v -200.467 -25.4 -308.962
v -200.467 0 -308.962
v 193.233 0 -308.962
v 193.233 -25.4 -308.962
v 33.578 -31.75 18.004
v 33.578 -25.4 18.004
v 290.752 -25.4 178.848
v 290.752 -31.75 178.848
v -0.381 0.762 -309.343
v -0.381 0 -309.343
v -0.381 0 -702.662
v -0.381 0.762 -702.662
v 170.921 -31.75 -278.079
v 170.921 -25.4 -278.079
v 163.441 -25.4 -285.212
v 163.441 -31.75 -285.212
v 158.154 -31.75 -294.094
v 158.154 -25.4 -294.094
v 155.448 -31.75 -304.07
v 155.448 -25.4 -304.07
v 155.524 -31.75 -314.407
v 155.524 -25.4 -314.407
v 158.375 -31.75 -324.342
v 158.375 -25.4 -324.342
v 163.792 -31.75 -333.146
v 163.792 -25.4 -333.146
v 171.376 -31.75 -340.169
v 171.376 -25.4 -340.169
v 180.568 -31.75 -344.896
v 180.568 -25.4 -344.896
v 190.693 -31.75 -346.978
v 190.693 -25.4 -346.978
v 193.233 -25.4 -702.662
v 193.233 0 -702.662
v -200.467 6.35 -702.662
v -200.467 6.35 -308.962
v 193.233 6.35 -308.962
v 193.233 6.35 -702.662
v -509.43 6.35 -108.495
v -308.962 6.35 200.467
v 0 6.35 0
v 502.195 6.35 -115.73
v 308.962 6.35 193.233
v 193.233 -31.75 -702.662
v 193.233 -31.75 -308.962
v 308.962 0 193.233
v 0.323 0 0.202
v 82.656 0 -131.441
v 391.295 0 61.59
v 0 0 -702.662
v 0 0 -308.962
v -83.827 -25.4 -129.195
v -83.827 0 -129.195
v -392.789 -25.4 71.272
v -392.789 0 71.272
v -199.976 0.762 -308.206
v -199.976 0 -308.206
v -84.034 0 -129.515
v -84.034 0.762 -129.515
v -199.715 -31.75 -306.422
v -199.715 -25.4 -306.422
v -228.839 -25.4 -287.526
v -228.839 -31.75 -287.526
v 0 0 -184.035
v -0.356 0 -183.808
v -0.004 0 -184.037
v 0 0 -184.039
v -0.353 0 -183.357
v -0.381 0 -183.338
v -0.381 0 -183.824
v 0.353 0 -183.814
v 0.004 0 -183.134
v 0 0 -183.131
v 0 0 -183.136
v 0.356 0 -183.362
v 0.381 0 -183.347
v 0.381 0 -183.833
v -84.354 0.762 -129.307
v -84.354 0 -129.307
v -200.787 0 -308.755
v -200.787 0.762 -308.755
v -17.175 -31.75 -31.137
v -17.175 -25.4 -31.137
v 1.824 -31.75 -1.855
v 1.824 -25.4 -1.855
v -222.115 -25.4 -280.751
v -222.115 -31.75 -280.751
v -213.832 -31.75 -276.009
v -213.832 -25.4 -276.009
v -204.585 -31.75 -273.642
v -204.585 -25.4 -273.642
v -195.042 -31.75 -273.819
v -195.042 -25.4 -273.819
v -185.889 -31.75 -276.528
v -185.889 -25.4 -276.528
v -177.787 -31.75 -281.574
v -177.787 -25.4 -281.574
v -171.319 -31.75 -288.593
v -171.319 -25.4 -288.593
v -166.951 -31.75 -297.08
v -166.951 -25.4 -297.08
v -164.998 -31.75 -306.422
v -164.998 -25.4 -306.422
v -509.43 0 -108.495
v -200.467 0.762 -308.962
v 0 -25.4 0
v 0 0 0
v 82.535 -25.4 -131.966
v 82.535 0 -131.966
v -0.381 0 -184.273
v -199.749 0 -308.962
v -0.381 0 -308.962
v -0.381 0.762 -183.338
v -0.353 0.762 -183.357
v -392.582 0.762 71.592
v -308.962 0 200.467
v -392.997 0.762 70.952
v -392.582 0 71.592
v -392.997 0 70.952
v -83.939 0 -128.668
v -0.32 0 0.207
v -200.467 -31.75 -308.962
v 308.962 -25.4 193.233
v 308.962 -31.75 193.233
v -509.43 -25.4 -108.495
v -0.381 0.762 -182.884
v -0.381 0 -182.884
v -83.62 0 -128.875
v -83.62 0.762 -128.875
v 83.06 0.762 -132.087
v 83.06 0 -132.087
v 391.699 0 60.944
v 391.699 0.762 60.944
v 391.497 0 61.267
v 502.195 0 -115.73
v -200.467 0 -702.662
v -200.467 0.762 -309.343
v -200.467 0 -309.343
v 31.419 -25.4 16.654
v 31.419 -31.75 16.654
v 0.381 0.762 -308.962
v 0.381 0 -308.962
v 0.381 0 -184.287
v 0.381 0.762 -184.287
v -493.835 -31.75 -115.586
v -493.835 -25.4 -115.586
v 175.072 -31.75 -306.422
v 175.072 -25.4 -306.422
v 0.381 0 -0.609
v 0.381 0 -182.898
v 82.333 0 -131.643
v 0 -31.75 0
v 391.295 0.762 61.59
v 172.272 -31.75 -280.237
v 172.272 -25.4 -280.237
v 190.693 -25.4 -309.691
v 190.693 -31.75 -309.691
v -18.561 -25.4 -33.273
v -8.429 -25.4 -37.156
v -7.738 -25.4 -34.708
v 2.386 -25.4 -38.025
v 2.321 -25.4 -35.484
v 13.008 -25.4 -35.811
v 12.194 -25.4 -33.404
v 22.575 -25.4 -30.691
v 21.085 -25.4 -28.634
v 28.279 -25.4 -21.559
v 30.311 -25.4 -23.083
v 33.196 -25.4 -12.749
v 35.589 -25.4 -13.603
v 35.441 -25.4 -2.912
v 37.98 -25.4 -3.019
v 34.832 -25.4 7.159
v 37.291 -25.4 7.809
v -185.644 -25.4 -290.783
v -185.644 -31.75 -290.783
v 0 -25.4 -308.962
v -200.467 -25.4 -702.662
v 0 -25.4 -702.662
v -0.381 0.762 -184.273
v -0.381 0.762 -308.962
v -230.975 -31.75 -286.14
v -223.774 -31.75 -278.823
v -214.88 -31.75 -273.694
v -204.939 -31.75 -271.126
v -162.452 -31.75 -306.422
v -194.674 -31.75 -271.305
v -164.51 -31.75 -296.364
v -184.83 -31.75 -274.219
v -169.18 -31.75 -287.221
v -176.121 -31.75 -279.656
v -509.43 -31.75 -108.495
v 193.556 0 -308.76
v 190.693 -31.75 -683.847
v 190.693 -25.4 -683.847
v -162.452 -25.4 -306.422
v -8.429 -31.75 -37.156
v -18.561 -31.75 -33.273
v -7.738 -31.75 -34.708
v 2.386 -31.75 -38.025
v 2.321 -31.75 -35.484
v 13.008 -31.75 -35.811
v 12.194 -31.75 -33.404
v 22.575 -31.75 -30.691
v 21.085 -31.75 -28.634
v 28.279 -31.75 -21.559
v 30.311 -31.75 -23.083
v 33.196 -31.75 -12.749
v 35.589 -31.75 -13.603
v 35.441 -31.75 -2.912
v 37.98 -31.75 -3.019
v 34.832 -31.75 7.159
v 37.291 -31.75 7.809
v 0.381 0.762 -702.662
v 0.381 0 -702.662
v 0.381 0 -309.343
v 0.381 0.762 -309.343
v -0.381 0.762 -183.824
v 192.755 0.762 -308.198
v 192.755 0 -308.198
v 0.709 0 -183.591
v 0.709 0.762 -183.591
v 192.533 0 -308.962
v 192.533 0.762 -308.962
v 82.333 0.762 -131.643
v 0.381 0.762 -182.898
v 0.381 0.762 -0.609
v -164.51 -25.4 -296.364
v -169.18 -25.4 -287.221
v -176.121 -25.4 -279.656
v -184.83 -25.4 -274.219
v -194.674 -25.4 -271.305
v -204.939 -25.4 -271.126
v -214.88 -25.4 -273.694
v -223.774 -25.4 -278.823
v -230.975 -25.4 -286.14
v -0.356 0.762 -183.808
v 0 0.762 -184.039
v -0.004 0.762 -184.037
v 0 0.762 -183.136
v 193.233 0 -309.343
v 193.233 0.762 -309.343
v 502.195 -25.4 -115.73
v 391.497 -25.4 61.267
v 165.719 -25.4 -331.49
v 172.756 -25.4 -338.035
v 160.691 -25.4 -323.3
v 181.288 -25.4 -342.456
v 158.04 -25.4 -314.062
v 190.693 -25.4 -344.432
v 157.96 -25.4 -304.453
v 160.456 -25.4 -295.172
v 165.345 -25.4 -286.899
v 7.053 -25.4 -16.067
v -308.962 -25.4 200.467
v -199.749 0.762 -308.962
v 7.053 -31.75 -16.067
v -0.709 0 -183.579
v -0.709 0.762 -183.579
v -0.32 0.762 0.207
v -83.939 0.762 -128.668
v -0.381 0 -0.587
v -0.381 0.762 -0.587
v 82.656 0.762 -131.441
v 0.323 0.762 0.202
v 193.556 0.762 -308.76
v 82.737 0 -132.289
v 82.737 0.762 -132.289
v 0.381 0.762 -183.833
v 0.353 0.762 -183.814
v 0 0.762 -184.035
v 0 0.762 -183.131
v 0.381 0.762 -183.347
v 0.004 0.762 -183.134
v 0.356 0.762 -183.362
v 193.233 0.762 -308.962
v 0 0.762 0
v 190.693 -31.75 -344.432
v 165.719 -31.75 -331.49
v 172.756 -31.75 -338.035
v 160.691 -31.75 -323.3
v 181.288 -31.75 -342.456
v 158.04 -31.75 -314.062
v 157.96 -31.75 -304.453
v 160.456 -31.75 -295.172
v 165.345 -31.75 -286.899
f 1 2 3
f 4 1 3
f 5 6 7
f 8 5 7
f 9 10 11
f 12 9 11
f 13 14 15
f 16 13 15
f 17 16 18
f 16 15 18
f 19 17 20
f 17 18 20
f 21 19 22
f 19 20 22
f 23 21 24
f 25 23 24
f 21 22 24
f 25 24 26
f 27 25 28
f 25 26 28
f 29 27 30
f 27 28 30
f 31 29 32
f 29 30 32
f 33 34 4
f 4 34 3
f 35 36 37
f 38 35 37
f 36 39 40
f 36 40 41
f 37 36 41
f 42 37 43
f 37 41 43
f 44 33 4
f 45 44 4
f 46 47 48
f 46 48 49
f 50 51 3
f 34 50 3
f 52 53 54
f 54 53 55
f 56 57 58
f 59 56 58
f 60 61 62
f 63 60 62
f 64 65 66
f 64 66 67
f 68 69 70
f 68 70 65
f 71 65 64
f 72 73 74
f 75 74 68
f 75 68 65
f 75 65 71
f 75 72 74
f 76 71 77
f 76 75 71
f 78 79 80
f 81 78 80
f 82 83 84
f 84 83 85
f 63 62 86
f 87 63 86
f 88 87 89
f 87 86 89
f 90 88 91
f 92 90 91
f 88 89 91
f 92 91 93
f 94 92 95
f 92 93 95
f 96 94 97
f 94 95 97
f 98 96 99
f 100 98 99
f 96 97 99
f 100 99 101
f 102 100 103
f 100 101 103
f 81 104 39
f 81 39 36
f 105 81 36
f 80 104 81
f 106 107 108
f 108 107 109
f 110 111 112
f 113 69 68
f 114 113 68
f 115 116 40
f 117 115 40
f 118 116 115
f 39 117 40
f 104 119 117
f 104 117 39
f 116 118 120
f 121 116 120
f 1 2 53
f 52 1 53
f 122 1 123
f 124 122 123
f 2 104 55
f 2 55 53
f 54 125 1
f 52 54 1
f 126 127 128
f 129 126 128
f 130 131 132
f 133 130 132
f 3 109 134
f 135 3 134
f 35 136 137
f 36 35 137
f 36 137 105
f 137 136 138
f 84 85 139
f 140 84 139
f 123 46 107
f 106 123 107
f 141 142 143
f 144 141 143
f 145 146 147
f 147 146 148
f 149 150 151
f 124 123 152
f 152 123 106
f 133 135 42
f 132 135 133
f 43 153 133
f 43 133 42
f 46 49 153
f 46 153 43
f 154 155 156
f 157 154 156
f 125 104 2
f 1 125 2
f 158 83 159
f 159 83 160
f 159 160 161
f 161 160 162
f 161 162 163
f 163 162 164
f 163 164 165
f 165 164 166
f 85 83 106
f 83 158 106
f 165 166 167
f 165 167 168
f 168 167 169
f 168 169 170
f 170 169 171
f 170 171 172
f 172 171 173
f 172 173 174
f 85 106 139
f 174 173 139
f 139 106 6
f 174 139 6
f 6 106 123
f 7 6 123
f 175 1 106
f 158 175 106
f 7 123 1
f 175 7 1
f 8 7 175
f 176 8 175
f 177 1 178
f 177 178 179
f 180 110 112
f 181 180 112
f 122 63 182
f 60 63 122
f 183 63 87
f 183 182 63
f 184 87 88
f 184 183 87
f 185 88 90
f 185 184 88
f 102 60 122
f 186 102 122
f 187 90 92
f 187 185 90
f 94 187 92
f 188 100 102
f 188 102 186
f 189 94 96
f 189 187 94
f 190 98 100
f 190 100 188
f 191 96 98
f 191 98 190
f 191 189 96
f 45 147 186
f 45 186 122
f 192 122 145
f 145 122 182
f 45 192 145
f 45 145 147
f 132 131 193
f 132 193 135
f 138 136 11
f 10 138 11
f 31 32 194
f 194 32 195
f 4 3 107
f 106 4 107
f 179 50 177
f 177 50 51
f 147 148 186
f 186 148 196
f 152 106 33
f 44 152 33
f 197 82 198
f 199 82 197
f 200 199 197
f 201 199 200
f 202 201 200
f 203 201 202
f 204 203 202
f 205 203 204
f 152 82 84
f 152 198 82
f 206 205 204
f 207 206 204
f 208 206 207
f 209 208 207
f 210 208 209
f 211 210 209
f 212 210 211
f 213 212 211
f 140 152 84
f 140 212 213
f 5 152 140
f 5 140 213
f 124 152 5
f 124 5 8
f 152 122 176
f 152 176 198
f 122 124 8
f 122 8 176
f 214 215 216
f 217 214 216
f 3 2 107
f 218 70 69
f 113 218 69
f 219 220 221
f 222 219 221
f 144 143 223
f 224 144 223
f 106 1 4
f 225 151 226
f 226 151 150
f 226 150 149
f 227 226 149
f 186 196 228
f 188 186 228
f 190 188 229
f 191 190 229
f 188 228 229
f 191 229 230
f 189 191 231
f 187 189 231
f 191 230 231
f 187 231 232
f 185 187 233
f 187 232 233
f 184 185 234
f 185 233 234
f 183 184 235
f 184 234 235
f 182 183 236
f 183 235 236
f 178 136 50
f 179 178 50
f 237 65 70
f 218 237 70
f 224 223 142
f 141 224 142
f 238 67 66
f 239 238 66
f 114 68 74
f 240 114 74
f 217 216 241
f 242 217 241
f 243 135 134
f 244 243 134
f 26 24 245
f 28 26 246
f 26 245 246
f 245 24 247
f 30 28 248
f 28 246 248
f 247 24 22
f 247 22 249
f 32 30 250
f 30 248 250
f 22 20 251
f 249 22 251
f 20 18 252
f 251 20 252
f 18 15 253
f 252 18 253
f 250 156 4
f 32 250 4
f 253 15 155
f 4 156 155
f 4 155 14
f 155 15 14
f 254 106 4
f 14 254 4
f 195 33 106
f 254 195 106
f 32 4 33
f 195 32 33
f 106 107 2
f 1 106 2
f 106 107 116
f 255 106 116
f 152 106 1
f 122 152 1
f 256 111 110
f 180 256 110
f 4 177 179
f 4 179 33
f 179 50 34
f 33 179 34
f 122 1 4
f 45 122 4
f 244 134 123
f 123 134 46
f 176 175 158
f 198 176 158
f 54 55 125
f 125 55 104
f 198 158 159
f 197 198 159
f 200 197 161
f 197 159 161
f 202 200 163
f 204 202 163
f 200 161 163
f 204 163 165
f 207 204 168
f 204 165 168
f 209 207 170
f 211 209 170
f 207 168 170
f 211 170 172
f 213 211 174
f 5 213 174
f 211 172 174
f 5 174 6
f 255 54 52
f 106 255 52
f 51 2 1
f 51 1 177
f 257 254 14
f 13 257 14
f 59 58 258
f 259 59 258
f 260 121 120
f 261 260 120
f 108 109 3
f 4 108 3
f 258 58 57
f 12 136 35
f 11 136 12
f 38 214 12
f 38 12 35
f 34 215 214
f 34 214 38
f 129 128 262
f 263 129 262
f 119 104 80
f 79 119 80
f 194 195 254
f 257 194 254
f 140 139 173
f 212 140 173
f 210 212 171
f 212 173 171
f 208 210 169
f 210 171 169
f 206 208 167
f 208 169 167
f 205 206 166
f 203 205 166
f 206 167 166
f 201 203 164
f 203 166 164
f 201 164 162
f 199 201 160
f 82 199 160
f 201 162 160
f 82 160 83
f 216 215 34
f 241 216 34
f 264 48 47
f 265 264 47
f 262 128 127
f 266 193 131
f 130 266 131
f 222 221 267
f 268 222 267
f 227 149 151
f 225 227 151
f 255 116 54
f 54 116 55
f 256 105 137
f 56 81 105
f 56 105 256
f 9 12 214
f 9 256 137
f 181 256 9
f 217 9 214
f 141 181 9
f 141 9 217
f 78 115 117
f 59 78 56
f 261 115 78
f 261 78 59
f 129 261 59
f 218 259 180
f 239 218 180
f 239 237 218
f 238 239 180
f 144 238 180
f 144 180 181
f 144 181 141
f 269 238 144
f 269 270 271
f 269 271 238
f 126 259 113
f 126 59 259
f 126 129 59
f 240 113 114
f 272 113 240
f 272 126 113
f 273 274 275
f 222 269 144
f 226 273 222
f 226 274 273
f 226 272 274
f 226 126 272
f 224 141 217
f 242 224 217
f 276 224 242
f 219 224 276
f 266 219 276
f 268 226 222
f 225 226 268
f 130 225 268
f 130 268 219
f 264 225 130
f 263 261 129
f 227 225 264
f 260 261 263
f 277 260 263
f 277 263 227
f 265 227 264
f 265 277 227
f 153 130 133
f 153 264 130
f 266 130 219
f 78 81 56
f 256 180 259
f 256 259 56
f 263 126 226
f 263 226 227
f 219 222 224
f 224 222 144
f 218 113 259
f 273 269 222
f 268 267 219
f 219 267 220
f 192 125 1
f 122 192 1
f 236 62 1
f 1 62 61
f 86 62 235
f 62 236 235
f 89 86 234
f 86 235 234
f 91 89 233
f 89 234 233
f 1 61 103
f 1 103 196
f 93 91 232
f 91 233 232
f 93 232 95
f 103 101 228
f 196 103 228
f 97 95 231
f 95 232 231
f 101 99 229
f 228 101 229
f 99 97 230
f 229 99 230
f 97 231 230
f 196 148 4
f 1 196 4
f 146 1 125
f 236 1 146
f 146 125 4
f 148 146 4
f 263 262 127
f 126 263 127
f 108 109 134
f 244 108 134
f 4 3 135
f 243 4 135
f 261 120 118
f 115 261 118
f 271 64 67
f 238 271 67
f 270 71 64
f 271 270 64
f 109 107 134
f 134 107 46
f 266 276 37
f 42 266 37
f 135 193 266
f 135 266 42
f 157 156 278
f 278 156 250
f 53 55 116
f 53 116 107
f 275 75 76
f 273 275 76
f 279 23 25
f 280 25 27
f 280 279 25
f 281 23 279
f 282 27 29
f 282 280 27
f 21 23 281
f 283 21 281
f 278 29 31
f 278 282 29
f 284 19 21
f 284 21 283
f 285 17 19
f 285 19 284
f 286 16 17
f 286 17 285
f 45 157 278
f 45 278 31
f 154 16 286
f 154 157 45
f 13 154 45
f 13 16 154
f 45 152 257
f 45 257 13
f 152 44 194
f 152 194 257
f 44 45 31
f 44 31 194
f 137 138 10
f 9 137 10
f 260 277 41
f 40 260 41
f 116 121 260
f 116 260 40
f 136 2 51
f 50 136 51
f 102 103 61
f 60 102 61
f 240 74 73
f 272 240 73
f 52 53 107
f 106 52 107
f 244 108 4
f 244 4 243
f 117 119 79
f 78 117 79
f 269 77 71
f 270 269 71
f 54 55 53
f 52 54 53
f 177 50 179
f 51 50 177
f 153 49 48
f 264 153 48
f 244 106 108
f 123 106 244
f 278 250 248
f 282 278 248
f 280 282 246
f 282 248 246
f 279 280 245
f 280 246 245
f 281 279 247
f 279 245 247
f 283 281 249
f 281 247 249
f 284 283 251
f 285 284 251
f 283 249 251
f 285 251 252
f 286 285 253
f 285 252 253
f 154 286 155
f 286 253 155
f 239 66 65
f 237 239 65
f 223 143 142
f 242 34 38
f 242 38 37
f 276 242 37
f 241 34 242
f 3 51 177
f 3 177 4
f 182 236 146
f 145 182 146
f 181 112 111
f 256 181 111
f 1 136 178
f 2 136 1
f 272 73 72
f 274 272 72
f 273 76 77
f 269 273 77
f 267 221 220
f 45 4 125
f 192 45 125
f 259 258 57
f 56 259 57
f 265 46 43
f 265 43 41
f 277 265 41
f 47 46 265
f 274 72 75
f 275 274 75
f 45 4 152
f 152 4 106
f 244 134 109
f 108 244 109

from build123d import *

# Parameters (mm, degrees)
F0_W      = 200.4671369366
F0_H      = 393.7
F0_W_2    = 193.2328630634
F1_DEPTH  = 6.35
F4_DEPTH  = 0.762
F5_DEPTH  = 25.4
F6_DEPTH  = 25.4
F7_DEPTH  = 25.4
F8_DEPTH  = 25.4
F10_DEPTH = 6.35
F12_DEPTH = 6.35
F14_DEPTH = 6.35


with BuildPart() as f1:
    # F0 (on Front) → F1 (new body)
    with BuildSketch(Plane.XZ):
        Polygon((-83.8269108523, -129.1950943436), (0, 0), (-308.9624847913, 200.4671369366), (-392.7893956437, 71.272042593), align=None)
        Polygon((-200.4671369366, -308.9624847913), (-83.8269108523, -129.1950943436), (-392.7893956437, 71.272042593), (-509.429621728, -108.4953478547), align=None)
        with Locations((-100.2335684683, -505.8124847913)):
            Rectangle(F0_W, F0_H)
        with Locations((96.6164315317, -505.8124847913)):
            Rectangle(F0_W_2, F0_H)
        Polygon((391.4973095124, 61.2668810695), (82.5348247211, -131.9659819939), (193.2328630634, -308.9624847913), (502.1953478547, -115.729621728), align=None)
        Polygon((308.9624847913, 193.2328630634), (0, 0), (82.5348247211, -131.9659819939), (391.4973095124, 61.2668810695), align=None)
        Polygon((193.2328630634, -308.9624847913), (82.5348247211, -131.9659819939), (0, -183.5853250156), align=None)
        Polygon((82.5348247211, -131.9659819939), (0, 0), (0, -183.5853250156), align=None)
        Polygon((0, -183.5853250156), (0, 0), (-83.8269108523, -129.1950943436), align=None)
        Polygon((0, -183.5853250156), (-83.8269108523, -129.1950943436), (-200.4671369366, -308.9624847913), align=None)
        Polygon((0, -308.9624847913), (0, -183.5853250156), (-200.4671369366, -308.9624847913), align=None)
        Polygon((193.2328630634, -308.9624847913), (0, -183.5853250156), (0, -308.9624847913), align=None)
    extrude(amount=-F1_DEPTH)

    # F2 (on face) + F3 (on face) → F4 (cut)
    with BuildSketch(Plane.XZ):
        with BuildLine():
            Line((-0.381, -182.8839444602), (0, -183.1311523995))
            Line((0, -183.1311523995), (0.0037617167, -183.1335931508))
            Line((0.0037617167, -183.1335931508), (0.381, -182.8976588962))
            Line((0.381, -182.8976588962), (0.381, 0))
            ThreePointArc((0.381, 0), (0, 0.381), (-0.381, 0))
            Line((-0.381, 0), (-0.381, -182.8839444602))
        make_face()
        Polygon((0, -183.1359458225), (0, -183.1311523995), (-0.381, -182.8839444602), (-0.381, -183.3381170764), (-0.3526576381, -183.356506727), align=None)
        Polygon((0.381, -182.8976588962), (0.0037617167, -183.1335931508), (0.3564193548, -183.3624114395), (0.381, -183.3470380894), align=None)
        with BuildLine():
            Line((-0.381, -183.3381170764), (-0.381, -182.8839444602))
            Line((-0.381, -182.8839444602), (-392.5820158468, 71.5916589566))
            ThreePointArc((-392.5820158468, 71.5916589566), (-393.1090120072, 71.4794223899), (-392.9967754405, 70.9524262295))
            Line((-392.9967754405, 70.9524262295), (-0.7090769929, -183.5794203031))
            Line((-0.7090769929, -183.5794203031), (-0.381, -183.3742327487))
            Line((-0.381, -183.3742327487), (-0.381, -183.3381170764))
        make_face()
        with BuildLine():
            Line((391.2952812025, 61.5899067062), (0.381, -182.8976588962))
            Line((0.381, -182.8976588962), (0.381, -183.3470380894))
            Line((0.381, -183.3470380894), (0.381, -183.3783603388))
            Line((0.381, -183.3783603388), (0.7090769929, -183.5912297281))
            Line((0.7090769929, -183.5912297281), (391.6993378223, 60.9438554327))
            ThreePointArc((391.6993378223, 60.9438554327), (391.8203351492, 61.4689093794), (391.2952812025, 61.5899067062))
        make_face()
        Polygon((0.3526576381, -183.8141433043), (0, -184.0347042088), (0, -184.0394976317), (0.381, -184.286705571), (0.381, -183.8325329549), align=None)
        Polygon((-0.0037617167, -184.0370568805), (-0.3564193548, -183.8082385918), (-0.381, -183.8236119419), (-0.381, -184.272991135), align=None)
        Polygon((-0.381, -183.7922896925), (-0.381, -183.3742327487), (-0.7090769929, -183.5794203031), align=None)
        Polygon((0.7090769929, -183.5912297281), (0.381, -183.3783603388), (0.381, -183.7964172825), align=None)
        with BuildLine():
            Line((0.381, -184.286705571), (0, -184.0394976317))
            Line((0, -184.0394976317), (-0.0037617167, -184.0370568805))
            Line((-0.0037617167, -184.0370568805), (-0.381, -184.272991135))
            Line((-0.381, -184.272991135), (-0.381, -702.6624847913))
            ThreePointArc((-0.381, -702.6624847913), (0, -703.0434847913), (0.381, -702.6624847913))
            Line((0.381, -702.6624847913), (0.381, -184.286705571))
        make_face()
        with BuildLine():
            Line((0.381, -183.7964172825), (0.381, -183.8325329549))
            Line((0.381, -183.8325329549), (0.381, -184.286705571))
            Line((0.381, -184.286705571), (193.0254832665, -309.2821011549))
            ThreePointArc((193.0254832665, -309.2821011549), (193.552479427, -309.1698645882), (193.4402428602, -308.6428684278))
            Line((193.4402428602, -308.6428684278), (0.7090769929, -183.5912297281))
            Line((0.7090769929, -183.5912297281), (0.381, -183.7964172825))
        make_face()
        with BuildLine():
            Line((-0.381, -184.272991135), (-0.381, -183.8236119419))
            Line((-0.381, -183.8236119419), (-0.381, -183.7922896925))
            Line((-0.381, -183.7922896925), (-0.7090769929, -183.5794203031))
            Line((-0.7090769929, -183.5794203031), (-200.6691652465, -308.6394591546))
            ThreePointArc((-200.6691652465, -308.6394591546), (-200.7901625734, -309.1645131012), (-200.2651086267, -309.2855104281))
            Line((-200.2651086267, -309.2855104281), (-0.381, -184.272991135))
        make_face()
    with BuildSketch(Plane.XZ):
        with BuildLine():
            Line((-0.2288182887, -0.3526576381), (0, 0))
            Line((0, 0), (0.2229135762, -0.3564193548))
            Line((0.2229135762, -0.3564193548), (0.3196163636, -0.2073797968))
            ThreePointArc((0.3196163636, -0.2073797968), (0.3809867906, -0.0031725997), (0.3230256367, 0.2020283099))
            ThreePointArc((0.3230256367, 0.2020283099), (0.0031725997, 0.3809867906), (-0.3196163636, 0.2073797968))
            ThreePointArc((-0.3196163636, 0.2073797968), (-0.3809867906, 0.0031725997), (-0.3230256367, -0.2020283099))
            Line((-0.3230256367, -0.2020283099), (-0.2288182887, -0.3526576381))
        make_face()
        with BuildLine():
            Line((-200.2199289974, -308.5814847913), (-0.2288182887, -0.3526576381))
            Line((-0.2288182887, -0.3526576381), (-0.3230256367, -0.2020283099))
            ThreePointArc((-0.3230256367, -0.2020283099), (-0.3809867906, 0.0031725997), (-0.3196163636, 0.2073797968))
            Line((-0.3196163636, 0.2073797968), (-200.7867533002, -308.7551049945))
            ThreePointArc((-200.7867533002, -308.7551049945), (-200.6490013056, -308.6276917936), (-200.4671369366, -308.5814847913))
            Line((-200.4671369366, -308.5814847913), (-200.2199289974, -308.5814847913))
        make_face()
        with BuildLine():
            Line((0.3196163636, -0.2073797968), (0.2229135762, -0.3564193548))
            Line((0.2229135762, -0.3564193548), (192.9945761371, -308.5814847913))
            Line((192.9945761371, -308.5814847913), (193.2328630634, -308.5814847913))
            ThreePointArc((193.2328630634, -308.5814847913), (193.4175089595, -308.6292177917), (193.5558887001, -308.7604564814))
            Line((193.5558887001, -308.7604564814), (0.3230256367, 0.2020283099))
            ThreePointArc((0.3230256367, 0.2020283099), (0.3809867906, -0.0031725997), (0.3196163636, -0.2073797968))
        make_face()
        with BuildLine():
            Line((-200.4671369366, -308.9624847913), (-200.2199289974, -308.5814847913))
            Line((-200.2199289974, -308.5814847913), (-200.4671369366, -308.5814847913))
            ThreePointArc((-200.4671369366, -308.5814847913), (-200.6490013056, -308.6276917936), (-200.7867533002, -308.7551049945))
            ThreePointArc((-200.7867533002, -308.7551049945), (-200.8019299343, -309.1443491603), (-200.4671369366, -309.3434847913))
            ThreePointArc((-200.4671369366, -309.3434847913), (-200.2852725676, -309.297277789), (-200.147520573, -309.1698645882))
            Line((-200.147520573, -309.1698645882), (-200.0129643205, -308.9624847913))
            Line((-200.0129643205, -308.9624847913), (-200.4671369366, -308.9624847913))
        make_face()
        with BuildLine():
            Line((193.2328630634, -308.5814847913), (192.9945761371, -308.5814847913))
            Line((192.9945761371, -308.5814847913), (193.2328630634, -308.9624847913))
            Line((193.2328630634, -308.9624847913), (192.7834838702, -308.9624847913))
            Line((192.7834838702, -308.9624847913), (192.9098374266, -309.1645131012))
            ThreePointArc((192.9098374266, -309.1645131012), (193.0482171672, -309.295751791), (193.2328630634, -309.3434847913))
            ThreePointArc((193.2328630634, -309.3434847913), (193.566130063, -309.1471306875), (193.5558887001, -308.7604564814))
            ThreePointArc((193.5558887001, -308.7604564814), (193.4175089595, -308.6292177917), (193.2328630634, -308.5814847913))
        make_face()
        with BuildLine():
            Line((192.7834838702, -308.9624847913), (-200.0129643205, -308.9624847913))
            Line((-200.0129643205, -308.9624847913), (-200.147520573, -309.1698645882))
            ThreePointArc((-200.147520573, -309.1698645882), (-200.2852725676, -309.297277789), (-200.4671369366, -309.3434847913))
            Line((-200.4671369366, -309.3434847913), (193.2328630634, -309.3434847913))
            ThreePointArc((193.2328630634, -309.3434847913), (193.0482171672, -309.295751791), (192.9098374266, -309.1645131012))
            Line((192.9098374266, -309.1645131012), (192.7834838702, -308.9624847913))
        make_face()
    extrude(amount=-F4_DEPTH, mode=Mode.SUBTRACT)


with BuildPart() as f5:
    # F0 (on Front) → F5 (new body)
    with BuildSketch(Plane.XZ):
        Polygon((-200.4671369366, -308.9624847913), (-83.8269108523, -129.1950943436), (-392.7893956437, 71.272042593), (-509.429621728, -108.4953478547), align=None)
    extrude(amount=F5_DEPTH)


with BuildPart() as f5b:
    # F0 (on Front) → F5, piece 2 (new body)
    with BuildSketch(Plane.XZ):
        with Locations((-100.2335684683, -505.8124847913)):
            Rectangle(F0_W, F0_H)
    extrude(amount=F5_DEPTH)


with BuildPart() as f6:
    # F0 (on Front) → F6 (new body)
    with BuildSketch(Plane.XZ):
        Polygon((391.4973095124, 61.2668810695), (82.5348247211, -131.9659819939), (193.2328630634, -308.9624847913), (502.1953478547, -115.729621728), align=None)
    extrude(amount=F6_DEPTH)


with BuildPart() as f6b:
    # F0 (on Front) → F6, piece 2 (new body)
    with BuildSketch(Plane.XZ):
        with Locations((96.6164315317, -505.8124847913)):
            Rectangle(F0_W_2, F0_H)
    extrude(amount=F6_DEPTH)


with BuildPart() as f7:
    # F0 (on Front) → F7 (new body)
    with BuildSketch(Plane.XZ):
        Polygon((308.9624847913, 193.2328630634), (0, 0), (82.5348247211, -131.9659819939), (391.4973095124, 61.2668810695), align=None)
    extrude(amount=F7_DEPTH)


with BuildPart() as f7b:
    # F0 (on Front) → F7, piece 2 (new body)
    with BuildSketch(Plane.XZ):
        Polygon((-83.8269108523, -129.1950943436), (0, 0), (-308.9624847913, 200.4671369366), (-392.7893956437, 71.272042593), align=None)
    extrude(amount=F7_DEPTH)


with BuildPart() as f8:
    # F0 (on Front) → F8 (new body)
    with BuildSketch(Plane.XZ):
        Polygon((0, -308.9624847913), (0, -183.5853250156), (-200.4671369366, -308.9624847913), align=None)
        Polygon((0, -183.5853250156), (-83.8269108523, -129.1950943436), (-200.4671369366, -308.9624847913), align=None)
        Polygon((0, -183.5853250156), (0, 0), (-83.8269108523, -129.1950943436), align=None)
        Polygon((82.5348247211, -131.9659819939), (0, 0), (0, -183.5853250156), align=None)
        Polygon((193.2328630634, -308.9624847913), (82.5348247211, -131.9659819939), (0, -183.5853250156), align=None)
        Polygon((193.2328630634, -308.9624847913), (0, -183.5853250156), (0, -308.9624847913), align=None)
    extrude(amount=F8_DEPTH)


with BuildPart() as f10:
    # F9 (on face) → F10 (new body)
    with BuildSketch(Plane.XZ.offset(25.4)):
        Polygon((-509.429621728, -108.4953478547), (-200.4671369366, -308.9624847913), (193.2328630634, -308.9624847913), align=None)
        with BuildLine():
            Line((-164.9979672255, -306.4224847913), (-199.7153065322, -306.4224847913))
            Line((-199.7153065322, -306.4224847913), (-228.8392691105, -287.525700613))
            ThreePointArc((-228.8392691105, -287.525700613), (-190.3743623666, -274.8648382233), (-164.9979672255, -306.4224847913))
        make_face(mode=Mode.SUBTRACT)
        with BuildLine():
            ThreePointArc((-162.451897887, -306.4224847913), (-189.6534498973, -272.4292920399), (-230.9751363634, -286.1398650693))
            Line((-230.9751363634, -286.1398650693), (-493.8354222417, -115.5856666852))
            Line((-493.8354222417, -115.5856666852), (175.0715859056, -306.4224847913))
            Line((175.0715859056, -306.4224847913), (-162.451897887, -306.4224847913))
        make_face(mode=Mode.SUBTRACT)
    extrude(amount=F10_DEPTH)


with BuildPart() as f12:
    # F11 (on face) → F12 (new body)
    with BuildSketch(Plane.XZ.offset(25.4)):
        Polygon((193.2328630634, -308.9624847913), (0, 0), (193.2328630634, -702.6624847913), align=None)
        with BuildLine():
            Line((7.0526502984, -16.0666931019), (170.9214730014, -278.0786399287))
            ThreePointArc((170.9214730014, -278.0786399287), (156.6108909975, -319.4715838016), (190.6928630634, -346.977723841))
            Line((190.6928630634, -346.977723841), (190.6928630634, -683.8469358795))
            Line((190.6928630634, -683.8469358795), (7.0526502984, -16.0666931019))
        make_face(mode=Mode.SUBTRACT)
        with BuildLine():
            Line((172.2715467163, -280.2372899792), (190.6928630634, -309.6913672076))
            Line((190.6928630634, -309.6913672076), (190.6928630634, -344.4316545025))
            ThreePointArc((190.6928630634, -344.4316545025), (159.0523558019, -318.770977201), (172.2715467163, -280.2372899792))
        make_face(mode=Mode.SUBTRACT)
    extrude(amount=F12_DEPTH)


with BuildPart() as f14:
    # F13 (on face) → F14 (new body)
    with BuildSketch(Plane.XZ.offset(25.4)):
        Polygon((308.9624847913, 193.2328630634), (0, 0), (-200.4671369366, -308.9624847913), align=None)
        with BuildLine():
            ThreePointArc((-18.5610682076, -33.2730633845), (26.7154976406, -27.1641709944), (33.5775556616, 18.0043815721))
            Line((33.5775556616, 18.0043815721), (290.7521120151, 178.8477793225))
            Line((290.7521120151, 178.8477793225), (-185.6435850577, -290.7827498101))
            Line((-185.6435850577, -290.7827498101), (-18.5610682076, -33.2730633845))
        make_face(mode=Mode.SUBTRACT)
        with BuildLine():
            Line((-17.175232664, -31.1371961316), (1.8242757965, -1.8549135915))
            Line((1.8242757965, -1.8549135915), (31.4189056111, 16.6543078572))
            ThreePointArc((31.4189056111, 16.6543078572), (24.9344644646, -25.3532262615), (-17.175232664, -31.1371961316))
        make_face(mode=Mode.SUBTRACT)
    extrude(amount=F14_DEPTH)


solid = Compound([f1.part, f5.part, f5b.part, f6.part, f6b.part, f7.part, f7b.part, f8.part, f10.part, f12.part, f14.part])
